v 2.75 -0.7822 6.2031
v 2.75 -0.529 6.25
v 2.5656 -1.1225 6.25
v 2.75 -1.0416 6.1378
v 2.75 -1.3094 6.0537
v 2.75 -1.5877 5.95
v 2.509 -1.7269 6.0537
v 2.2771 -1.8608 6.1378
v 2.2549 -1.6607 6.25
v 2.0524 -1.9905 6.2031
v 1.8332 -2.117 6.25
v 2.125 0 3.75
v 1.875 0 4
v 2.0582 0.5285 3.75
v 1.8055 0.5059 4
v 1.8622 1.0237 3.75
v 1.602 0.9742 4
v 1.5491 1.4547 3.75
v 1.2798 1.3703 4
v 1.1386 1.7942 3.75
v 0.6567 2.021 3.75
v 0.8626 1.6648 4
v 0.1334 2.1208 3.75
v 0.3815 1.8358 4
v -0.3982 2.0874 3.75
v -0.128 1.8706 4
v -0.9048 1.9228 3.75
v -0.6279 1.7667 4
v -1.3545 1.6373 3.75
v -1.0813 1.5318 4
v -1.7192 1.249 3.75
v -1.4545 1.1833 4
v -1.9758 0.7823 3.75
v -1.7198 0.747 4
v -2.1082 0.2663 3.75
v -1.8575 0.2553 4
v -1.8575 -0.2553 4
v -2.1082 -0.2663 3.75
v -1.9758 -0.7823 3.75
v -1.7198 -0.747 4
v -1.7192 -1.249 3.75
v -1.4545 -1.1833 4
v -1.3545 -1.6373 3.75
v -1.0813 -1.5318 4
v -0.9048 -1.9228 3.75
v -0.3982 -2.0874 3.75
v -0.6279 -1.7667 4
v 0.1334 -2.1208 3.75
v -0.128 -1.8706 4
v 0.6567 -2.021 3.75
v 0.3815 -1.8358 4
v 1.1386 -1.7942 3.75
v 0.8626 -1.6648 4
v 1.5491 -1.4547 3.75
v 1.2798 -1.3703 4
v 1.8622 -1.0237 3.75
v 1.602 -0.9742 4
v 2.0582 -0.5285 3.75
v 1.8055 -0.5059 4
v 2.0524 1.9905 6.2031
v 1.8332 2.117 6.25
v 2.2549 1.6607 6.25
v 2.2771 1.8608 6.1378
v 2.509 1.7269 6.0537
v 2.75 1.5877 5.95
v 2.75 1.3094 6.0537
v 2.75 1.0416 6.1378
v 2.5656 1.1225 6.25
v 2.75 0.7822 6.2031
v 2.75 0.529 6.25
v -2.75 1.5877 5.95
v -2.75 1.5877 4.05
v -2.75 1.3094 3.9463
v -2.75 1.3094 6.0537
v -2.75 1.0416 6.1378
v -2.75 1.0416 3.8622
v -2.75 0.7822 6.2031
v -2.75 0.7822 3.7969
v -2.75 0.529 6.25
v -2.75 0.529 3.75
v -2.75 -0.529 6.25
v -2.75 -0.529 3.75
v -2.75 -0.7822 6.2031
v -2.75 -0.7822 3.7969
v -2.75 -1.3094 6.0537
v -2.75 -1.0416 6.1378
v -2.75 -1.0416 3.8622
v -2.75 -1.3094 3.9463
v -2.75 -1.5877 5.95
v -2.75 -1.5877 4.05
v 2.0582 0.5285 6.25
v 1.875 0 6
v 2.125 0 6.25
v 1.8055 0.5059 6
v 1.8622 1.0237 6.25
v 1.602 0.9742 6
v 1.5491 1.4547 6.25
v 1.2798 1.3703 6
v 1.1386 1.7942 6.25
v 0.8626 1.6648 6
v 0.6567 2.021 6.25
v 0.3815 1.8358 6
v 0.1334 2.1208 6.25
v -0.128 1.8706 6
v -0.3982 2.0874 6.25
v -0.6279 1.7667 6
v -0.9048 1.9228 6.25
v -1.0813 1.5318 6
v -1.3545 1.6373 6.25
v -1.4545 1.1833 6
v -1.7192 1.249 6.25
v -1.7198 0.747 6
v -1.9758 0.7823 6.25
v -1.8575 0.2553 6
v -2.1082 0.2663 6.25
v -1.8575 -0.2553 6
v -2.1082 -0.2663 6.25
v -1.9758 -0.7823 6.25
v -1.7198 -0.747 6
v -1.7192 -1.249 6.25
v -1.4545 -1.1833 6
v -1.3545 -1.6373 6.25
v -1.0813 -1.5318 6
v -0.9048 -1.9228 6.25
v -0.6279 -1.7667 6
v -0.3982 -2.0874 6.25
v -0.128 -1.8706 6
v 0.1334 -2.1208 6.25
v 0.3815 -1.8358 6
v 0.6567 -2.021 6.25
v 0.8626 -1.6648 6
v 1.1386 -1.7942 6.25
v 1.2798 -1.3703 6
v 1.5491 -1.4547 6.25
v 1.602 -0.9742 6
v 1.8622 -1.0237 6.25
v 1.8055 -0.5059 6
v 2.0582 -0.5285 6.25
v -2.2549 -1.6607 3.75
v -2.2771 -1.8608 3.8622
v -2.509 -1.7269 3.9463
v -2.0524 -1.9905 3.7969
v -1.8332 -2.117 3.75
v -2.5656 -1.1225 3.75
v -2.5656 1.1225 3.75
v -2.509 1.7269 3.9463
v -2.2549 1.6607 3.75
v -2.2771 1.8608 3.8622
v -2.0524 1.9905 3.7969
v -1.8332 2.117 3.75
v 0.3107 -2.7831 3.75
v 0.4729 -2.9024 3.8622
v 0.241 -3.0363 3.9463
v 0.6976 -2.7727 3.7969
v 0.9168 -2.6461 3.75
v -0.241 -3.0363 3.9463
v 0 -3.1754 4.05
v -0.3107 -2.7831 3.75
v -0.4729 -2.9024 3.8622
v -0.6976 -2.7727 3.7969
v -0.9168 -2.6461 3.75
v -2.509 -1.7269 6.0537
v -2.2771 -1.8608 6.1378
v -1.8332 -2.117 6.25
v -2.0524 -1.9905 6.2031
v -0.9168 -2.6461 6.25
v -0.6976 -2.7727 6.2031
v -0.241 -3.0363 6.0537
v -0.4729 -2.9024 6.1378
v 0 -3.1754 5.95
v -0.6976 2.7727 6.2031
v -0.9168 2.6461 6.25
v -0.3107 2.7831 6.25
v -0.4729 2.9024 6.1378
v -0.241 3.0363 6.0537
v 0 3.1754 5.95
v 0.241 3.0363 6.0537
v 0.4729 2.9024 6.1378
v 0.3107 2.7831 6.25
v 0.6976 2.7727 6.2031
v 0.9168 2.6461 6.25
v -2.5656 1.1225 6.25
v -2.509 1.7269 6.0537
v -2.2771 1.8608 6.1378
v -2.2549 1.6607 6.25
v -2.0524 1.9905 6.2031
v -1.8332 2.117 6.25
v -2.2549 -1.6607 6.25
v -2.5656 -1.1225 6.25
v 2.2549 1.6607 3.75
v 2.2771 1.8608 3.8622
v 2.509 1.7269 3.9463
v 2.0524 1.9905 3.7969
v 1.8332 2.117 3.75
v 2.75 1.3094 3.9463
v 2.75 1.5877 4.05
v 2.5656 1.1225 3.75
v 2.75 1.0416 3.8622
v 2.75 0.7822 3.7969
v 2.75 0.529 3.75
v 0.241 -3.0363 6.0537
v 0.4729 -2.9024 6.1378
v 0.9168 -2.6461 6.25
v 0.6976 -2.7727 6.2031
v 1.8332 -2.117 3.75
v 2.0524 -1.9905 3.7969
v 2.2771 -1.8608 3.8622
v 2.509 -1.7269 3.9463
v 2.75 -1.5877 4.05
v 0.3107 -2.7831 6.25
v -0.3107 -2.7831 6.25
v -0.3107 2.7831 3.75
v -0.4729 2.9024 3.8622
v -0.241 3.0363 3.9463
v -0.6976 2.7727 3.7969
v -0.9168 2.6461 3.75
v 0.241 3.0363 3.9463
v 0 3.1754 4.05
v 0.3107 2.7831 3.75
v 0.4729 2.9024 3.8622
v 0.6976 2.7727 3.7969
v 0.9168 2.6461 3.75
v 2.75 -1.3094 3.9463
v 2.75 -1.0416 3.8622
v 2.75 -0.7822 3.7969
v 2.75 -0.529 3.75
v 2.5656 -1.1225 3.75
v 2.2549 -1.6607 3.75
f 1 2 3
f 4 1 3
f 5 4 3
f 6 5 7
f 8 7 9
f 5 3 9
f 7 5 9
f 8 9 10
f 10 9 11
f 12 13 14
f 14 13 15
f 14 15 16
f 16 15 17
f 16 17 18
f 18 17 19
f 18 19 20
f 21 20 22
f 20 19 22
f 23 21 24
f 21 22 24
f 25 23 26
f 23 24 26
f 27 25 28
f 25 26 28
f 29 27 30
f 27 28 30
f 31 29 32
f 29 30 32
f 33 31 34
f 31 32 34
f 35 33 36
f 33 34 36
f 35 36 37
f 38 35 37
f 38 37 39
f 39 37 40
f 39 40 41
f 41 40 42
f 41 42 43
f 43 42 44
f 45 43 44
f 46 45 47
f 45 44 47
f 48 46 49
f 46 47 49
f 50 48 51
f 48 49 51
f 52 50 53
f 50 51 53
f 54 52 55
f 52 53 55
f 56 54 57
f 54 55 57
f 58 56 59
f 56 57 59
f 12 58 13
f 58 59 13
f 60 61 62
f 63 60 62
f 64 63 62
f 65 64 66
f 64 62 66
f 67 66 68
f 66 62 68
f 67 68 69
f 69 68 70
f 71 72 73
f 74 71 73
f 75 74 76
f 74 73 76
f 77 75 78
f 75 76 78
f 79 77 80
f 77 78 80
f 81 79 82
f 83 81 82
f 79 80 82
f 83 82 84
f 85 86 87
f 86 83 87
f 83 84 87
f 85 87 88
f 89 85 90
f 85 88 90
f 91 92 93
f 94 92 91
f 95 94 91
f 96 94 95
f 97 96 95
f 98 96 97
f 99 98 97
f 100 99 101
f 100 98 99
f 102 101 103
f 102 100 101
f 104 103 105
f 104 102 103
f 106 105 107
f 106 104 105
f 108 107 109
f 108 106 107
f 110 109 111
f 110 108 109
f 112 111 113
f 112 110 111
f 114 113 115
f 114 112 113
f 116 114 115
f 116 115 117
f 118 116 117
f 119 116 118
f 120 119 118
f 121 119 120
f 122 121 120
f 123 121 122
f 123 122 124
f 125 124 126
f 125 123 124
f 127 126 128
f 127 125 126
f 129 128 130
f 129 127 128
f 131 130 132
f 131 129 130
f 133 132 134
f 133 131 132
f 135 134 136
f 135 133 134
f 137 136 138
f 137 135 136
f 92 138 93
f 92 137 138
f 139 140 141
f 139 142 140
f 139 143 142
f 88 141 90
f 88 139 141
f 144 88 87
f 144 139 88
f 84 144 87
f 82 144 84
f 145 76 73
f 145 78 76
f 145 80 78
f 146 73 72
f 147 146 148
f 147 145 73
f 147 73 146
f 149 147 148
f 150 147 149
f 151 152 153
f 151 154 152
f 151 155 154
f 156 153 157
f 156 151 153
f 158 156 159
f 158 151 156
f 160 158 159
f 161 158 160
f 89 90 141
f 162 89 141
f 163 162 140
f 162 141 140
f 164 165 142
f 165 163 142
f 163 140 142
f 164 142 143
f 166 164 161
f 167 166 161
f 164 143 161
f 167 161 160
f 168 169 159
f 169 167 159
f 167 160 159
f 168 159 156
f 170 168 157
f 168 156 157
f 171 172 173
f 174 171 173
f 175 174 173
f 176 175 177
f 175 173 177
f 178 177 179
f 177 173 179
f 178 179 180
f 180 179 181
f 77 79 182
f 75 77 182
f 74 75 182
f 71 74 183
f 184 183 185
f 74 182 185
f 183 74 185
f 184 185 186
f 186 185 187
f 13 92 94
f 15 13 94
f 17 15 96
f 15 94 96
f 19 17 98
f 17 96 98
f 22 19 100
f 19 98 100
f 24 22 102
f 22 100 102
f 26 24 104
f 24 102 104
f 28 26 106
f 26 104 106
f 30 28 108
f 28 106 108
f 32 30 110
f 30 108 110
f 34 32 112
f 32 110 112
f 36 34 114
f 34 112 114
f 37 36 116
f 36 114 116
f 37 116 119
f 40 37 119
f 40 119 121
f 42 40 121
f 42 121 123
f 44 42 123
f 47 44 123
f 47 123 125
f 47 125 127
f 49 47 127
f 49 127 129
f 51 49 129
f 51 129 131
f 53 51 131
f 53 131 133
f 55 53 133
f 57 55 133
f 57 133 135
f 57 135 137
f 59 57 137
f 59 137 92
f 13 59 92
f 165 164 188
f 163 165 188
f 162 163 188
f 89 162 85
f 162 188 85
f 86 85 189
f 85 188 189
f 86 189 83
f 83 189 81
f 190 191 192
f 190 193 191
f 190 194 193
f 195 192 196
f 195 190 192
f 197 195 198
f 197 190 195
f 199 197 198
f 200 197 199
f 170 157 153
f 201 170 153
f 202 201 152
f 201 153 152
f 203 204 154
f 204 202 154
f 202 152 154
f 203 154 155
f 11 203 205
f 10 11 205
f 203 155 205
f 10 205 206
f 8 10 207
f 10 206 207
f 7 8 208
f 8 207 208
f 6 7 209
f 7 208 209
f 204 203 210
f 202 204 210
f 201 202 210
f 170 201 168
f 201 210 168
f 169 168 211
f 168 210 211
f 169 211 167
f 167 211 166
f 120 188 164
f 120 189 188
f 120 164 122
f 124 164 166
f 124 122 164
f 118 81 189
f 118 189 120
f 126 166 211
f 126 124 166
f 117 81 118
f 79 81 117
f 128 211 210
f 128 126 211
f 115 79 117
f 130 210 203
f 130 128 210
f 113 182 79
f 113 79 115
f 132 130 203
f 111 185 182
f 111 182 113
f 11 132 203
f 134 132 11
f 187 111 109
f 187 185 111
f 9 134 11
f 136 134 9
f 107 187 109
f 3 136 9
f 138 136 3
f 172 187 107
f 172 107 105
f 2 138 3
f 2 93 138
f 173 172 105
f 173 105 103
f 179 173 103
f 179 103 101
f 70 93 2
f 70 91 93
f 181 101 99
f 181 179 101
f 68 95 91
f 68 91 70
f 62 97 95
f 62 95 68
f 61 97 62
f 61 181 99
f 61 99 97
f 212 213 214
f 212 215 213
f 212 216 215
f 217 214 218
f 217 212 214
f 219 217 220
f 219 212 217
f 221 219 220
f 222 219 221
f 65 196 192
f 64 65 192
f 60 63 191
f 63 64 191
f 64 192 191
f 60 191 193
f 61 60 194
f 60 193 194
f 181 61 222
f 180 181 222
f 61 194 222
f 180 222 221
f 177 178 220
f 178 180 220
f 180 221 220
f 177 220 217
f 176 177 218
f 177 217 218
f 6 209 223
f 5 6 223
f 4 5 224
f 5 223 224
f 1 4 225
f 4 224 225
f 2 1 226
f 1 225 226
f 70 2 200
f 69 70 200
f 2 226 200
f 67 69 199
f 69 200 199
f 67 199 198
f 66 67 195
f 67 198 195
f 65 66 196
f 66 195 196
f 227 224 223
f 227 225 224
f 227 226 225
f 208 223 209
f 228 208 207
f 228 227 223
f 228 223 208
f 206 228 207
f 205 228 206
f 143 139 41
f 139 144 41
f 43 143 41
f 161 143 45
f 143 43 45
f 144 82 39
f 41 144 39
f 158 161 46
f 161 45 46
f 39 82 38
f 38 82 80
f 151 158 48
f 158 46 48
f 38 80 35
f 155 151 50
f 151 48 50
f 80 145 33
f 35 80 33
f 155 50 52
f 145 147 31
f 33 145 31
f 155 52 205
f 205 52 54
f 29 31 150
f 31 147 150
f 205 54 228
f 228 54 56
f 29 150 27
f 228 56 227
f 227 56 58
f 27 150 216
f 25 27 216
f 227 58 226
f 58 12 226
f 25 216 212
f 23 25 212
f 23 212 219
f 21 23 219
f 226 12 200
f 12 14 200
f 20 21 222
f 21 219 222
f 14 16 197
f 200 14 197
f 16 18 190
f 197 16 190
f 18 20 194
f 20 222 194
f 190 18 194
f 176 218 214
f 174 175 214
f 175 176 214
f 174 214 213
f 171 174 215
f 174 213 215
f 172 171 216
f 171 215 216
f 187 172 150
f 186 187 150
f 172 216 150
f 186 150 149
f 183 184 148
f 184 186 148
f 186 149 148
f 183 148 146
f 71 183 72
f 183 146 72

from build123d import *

# Parameters (mm, degrees)
BOSS_EXTRUDE1_DEPTH = 10
SKETCH2_R           = 7.5
CUT_EXTRUDE1_DEPTH  = 20.553345835
CHAMFER1_SIZE       = 1
SCALE1_SCALE        = 0.25


with BuildPart() as part:
    # Sketch1 → Boss-Extrude1 (new body)
    with BuildSketch(Plane.XY):
        Polygon((11, -6.350852961), (11, 6.350852961), (0, 12.701705922), (-11, 6.350852961), (-11, -6.350852961), (0, -12.701705922), align=None)
    extrude(amount=BOSS_EXTRUDE1_DEPTH)

    # Sketch2 → Cut-Extrude1 (cut, through all)
    with BuildSketch(Plane.XY.offset(10)):
        Circle(SKETCH2_R)
    extrude(amount=-CUT_EXTRUDE1_DEPTH, mode=Mode.SUBTRACT)

    # Chamfer1
    chamfer1_edges = [part.edges().sort_by_distance(p)[0] for p in [
        (-7.5, 0, 0),
        (-7.5, 0, 10),
    ]]
    chamfer(chamfer1_edges, length=CHAMFER1_SIZE)

    # Sketch3 → Cut-Revolve1 (revolve, cut)
    with BuildSketch(Plane(origin=(0, 0, 0), x_dir=(0, 0, -1), z_dir=(1, 0, 0))):
        Polygon((-1.2, 12.701705922), (0, 11.201705922), (0, 12.701705922), align=None)
        Polygon((-10, 12.701705922), (-8.8, 12.701705922), (-10, 11.201705922), align=None)
    revolve(axis=Axis((0, 0, 11.931006721), (0, 0, -1)), mode=Mode.SUBTRACT)


with BuildPart() as part_1:
    # Scale1: scaled about (0, 0, 5)
    add(part.part.scale(SCALE1_SCALE).moved(Location((0, 0, 3.75))))


solid = part_1.part
